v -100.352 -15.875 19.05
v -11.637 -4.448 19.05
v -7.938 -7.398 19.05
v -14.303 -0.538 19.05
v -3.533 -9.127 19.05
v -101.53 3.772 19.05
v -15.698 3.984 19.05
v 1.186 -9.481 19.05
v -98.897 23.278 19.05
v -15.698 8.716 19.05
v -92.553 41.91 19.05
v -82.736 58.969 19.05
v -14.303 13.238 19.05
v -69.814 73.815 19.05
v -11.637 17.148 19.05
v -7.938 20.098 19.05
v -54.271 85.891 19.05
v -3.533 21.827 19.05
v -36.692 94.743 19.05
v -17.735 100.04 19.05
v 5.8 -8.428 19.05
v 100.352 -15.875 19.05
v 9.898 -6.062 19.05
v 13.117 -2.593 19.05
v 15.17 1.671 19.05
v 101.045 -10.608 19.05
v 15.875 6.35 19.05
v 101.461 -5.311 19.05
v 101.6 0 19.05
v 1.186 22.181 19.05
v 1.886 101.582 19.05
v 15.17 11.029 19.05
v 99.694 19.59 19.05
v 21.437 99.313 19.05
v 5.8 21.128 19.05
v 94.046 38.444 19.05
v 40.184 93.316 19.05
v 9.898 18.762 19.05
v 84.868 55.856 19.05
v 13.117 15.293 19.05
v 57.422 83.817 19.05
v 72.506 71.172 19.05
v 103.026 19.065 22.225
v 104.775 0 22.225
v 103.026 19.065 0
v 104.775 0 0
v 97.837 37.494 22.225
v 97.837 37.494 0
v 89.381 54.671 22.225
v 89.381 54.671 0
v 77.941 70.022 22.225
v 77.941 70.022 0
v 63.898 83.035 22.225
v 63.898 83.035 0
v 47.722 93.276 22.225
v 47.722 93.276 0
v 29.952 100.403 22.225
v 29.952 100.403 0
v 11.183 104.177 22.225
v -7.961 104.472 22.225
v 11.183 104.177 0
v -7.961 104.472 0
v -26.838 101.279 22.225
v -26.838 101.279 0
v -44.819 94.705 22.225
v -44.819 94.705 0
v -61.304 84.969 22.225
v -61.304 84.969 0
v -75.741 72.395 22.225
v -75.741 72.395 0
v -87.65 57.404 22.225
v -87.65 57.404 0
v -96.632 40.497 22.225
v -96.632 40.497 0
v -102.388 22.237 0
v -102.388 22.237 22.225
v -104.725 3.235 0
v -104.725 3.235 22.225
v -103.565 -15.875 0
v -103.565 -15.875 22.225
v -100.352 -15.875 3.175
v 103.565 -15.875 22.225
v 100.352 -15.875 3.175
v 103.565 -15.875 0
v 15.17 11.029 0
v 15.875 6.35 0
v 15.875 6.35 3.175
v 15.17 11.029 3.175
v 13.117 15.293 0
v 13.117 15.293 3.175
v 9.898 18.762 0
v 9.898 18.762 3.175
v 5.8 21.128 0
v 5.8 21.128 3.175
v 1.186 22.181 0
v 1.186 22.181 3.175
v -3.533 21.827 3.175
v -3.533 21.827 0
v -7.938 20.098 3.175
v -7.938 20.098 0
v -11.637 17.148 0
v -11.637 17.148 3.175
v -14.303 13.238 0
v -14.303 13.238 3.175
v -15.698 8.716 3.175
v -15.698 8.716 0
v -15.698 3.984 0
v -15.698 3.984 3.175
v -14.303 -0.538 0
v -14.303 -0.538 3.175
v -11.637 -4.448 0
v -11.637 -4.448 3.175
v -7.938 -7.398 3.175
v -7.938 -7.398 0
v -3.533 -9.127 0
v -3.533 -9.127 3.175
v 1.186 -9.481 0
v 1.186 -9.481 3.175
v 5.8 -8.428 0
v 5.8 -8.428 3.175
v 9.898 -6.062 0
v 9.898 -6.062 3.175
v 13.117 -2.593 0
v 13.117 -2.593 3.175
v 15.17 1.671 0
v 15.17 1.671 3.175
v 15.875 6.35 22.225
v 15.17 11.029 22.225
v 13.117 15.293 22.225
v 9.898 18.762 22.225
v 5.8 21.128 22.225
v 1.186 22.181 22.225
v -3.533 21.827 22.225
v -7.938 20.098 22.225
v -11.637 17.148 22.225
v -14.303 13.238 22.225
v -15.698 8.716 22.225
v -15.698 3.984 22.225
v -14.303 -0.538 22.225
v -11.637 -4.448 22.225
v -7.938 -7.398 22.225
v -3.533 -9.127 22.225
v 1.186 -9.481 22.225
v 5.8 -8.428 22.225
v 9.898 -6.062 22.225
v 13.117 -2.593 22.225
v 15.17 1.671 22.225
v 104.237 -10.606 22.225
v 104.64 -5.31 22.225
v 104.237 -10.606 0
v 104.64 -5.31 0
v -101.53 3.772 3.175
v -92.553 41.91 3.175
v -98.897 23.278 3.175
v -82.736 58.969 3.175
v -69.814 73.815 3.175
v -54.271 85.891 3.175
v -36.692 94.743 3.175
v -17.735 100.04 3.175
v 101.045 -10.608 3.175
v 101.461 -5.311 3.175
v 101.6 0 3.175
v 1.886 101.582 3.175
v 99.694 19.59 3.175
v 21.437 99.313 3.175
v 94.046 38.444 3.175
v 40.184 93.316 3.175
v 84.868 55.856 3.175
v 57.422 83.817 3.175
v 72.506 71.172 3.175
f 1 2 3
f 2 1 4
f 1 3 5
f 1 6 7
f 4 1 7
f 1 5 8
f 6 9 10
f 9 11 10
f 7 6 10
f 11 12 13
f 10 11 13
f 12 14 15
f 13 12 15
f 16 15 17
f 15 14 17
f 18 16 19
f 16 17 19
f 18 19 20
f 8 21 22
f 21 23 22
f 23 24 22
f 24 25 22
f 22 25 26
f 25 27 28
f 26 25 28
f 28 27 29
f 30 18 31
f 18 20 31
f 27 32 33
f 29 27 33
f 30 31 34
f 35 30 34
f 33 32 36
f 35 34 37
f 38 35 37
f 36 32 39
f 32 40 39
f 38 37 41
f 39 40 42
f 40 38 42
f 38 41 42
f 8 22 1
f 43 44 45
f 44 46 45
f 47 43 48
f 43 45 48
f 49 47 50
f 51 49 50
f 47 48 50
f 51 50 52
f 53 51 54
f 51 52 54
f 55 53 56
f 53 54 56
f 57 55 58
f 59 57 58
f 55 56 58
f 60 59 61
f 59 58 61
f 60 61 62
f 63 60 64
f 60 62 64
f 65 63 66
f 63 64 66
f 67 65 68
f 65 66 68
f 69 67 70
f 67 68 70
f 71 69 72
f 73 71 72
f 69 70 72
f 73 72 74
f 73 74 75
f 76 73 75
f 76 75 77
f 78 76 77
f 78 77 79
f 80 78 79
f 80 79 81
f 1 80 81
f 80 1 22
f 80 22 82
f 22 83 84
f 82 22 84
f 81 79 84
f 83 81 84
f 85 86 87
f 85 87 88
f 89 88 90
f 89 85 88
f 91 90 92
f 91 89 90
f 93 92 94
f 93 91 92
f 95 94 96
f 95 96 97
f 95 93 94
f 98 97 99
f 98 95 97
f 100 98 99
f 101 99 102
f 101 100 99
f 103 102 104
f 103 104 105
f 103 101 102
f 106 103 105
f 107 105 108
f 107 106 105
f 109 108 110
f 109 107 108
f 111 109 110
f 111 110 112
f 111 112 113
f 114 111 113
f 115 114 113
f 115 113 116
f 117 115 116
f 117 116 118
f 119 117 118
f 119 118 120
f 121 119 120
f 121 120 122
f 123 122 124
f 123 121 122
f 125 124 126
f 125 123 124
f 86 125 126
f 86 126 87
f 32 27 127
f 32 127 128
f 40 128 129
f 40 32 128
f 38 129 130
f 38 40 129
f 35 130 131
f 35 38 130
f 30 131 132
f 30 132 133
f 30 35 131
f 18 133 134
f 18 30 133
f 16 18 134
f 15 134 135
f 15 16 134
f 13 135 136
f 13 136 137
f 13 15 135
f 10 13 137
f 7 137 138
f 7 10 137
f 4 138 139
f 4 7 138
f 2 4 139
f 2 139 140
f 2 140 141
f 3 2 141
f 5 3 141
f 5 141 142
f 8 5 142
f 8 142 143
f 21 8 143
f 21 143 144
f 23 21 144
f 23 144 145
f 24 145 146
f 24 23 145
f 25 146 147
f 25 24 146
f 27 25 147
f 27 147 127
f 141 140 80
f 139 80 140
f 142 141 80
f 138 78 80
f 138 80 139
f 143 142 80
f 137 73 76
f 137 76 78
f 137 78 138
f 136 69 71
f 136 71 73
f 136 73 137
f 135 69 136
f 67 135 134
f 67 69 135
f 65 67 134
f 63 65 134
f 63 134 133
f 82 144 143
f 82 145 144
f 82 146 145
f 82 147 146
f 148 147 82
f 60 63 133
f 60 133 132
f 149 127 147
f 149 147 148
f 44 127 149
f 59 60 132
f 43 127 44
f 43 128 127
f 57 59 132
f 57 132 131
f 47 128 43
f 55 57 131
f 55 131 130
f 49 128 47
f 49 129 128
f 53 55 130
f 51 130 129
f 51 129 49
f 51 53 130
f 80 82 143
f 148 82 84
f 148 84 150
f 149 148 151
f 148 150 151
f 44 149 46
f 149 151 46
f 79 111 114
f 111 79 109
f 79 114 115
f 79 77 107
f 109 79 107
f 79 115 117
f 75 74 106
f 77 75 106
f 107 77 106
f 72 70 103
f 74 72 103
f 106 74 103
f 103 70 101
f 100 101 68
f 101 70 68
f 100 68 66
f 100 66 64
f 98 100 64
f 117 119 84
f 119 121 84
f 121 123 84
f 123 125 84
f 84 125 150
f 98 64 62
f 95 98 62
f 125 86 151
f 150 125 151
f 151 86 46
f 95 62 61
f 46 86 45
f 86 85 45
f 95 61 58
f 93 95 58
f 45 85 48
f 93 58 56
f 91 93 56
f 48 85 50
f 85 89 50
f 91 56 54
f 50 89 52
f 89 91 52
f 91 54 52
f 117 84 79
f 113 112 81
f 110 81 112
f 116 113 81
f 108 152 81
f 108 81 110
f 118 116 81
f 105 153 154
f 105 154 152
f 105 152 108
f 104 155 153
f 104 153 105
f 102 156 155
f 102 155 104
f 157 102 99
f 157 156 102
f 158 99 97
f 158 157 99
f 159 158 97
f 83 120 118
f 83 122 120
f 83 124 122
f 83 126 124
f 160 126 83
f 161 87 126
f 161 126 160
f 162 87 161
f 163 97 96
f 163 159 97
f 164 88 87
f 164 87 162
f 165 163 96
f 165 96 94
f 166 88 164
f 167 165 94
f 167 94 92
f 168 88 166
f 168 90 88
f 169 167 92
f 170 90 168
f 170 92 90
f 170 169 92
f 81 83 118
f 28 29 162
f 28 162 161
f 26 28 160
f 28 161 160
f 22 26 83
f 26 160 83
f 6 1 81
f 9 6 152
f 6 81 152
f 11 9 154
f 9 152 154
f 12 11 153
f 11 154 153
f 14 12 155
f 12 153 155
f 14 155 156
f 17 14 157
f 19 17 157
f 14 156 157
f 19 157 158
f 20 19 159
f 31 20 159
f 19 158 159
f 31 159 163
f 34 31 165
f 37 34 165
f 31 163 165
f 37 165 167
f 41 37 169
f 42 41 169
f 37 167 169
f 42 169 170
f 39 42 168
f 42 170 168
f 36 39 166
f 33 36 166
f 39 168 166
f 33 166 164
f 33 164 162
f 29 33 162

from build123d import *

# Parameters (mm, degrees)
F0_R     = 15.875
F1_DEPTH = 3.175
F2_DEPTH = 19.05
F3_R     = 15.875
F4_DEPTH = 3.175


with BuildPart() as f1:
    # F0 (on Top) → F1 (new body)
    with BuildSketch(Plane.XY):
        with BuildLine():
            ThreePointArc((101.6, 0), (-7.961986, 101.287545), (-100.352102, -15.875))
            Line((-100.352102, -15.875), (100.352102, -15.875))
            ThreePointArc((100.352102, -15.875), (101.287545, -7.961986), (101.6, 0))
        make_face()
        with Locations((0, 6.35)):
            Circle(F0_R, mode=Mode.SUBTRACT)
    extrude(amount=F1_DEPTH)

    # F0 (on Top) → F2 (join)
    with BuildSketch(Plane.XY):
        with BuildLine():
            ThreePointArc((103.565366, -15.875), (104.472154, -7.960509), (104.775, 0))
            ThreePointArc((104.775, 0), (-7.960509, 104.472154), (-103.565366, -15.875))
            Line((-103.565366, -15.875), (-100.352102, -15.875))
            ThreePointArc((-100.352102, -15.875), (-7.961986, 101.287545), (101.6, 0))
            ThreePointArc((101.6, 0), (101.287545, -7.961986), (100.352102, -15.875))
            Line((100.352102, -15.875), (103.565366, -15.875))
        make_face()
    extrude(amount=F2_DEPTH)

    # F3 (on face) → F4 (join)
    with BuildSketch(Plane.XY.offset(19.05)):
        with BuildLine():
            ThreePointArc((103.565366, -15.875), (104.472154, -7.960509), (104.775, 0))
            ThreePointArc((104.775, 0), (-7.960509, 104.472154), (-103.565366, -15.875))
            Line((-103.565366, -15.875), (-100.352102, -15.875))
            Line((-100.352102, -15.875), (103.565366, -15.875))
        make_face()
        with Locations((0, 6.35)):
            Circle(F3_R, mode=Mode.SUBTRACT)
    extrude(amount=F4_DEPTH)


solid = f1.part
